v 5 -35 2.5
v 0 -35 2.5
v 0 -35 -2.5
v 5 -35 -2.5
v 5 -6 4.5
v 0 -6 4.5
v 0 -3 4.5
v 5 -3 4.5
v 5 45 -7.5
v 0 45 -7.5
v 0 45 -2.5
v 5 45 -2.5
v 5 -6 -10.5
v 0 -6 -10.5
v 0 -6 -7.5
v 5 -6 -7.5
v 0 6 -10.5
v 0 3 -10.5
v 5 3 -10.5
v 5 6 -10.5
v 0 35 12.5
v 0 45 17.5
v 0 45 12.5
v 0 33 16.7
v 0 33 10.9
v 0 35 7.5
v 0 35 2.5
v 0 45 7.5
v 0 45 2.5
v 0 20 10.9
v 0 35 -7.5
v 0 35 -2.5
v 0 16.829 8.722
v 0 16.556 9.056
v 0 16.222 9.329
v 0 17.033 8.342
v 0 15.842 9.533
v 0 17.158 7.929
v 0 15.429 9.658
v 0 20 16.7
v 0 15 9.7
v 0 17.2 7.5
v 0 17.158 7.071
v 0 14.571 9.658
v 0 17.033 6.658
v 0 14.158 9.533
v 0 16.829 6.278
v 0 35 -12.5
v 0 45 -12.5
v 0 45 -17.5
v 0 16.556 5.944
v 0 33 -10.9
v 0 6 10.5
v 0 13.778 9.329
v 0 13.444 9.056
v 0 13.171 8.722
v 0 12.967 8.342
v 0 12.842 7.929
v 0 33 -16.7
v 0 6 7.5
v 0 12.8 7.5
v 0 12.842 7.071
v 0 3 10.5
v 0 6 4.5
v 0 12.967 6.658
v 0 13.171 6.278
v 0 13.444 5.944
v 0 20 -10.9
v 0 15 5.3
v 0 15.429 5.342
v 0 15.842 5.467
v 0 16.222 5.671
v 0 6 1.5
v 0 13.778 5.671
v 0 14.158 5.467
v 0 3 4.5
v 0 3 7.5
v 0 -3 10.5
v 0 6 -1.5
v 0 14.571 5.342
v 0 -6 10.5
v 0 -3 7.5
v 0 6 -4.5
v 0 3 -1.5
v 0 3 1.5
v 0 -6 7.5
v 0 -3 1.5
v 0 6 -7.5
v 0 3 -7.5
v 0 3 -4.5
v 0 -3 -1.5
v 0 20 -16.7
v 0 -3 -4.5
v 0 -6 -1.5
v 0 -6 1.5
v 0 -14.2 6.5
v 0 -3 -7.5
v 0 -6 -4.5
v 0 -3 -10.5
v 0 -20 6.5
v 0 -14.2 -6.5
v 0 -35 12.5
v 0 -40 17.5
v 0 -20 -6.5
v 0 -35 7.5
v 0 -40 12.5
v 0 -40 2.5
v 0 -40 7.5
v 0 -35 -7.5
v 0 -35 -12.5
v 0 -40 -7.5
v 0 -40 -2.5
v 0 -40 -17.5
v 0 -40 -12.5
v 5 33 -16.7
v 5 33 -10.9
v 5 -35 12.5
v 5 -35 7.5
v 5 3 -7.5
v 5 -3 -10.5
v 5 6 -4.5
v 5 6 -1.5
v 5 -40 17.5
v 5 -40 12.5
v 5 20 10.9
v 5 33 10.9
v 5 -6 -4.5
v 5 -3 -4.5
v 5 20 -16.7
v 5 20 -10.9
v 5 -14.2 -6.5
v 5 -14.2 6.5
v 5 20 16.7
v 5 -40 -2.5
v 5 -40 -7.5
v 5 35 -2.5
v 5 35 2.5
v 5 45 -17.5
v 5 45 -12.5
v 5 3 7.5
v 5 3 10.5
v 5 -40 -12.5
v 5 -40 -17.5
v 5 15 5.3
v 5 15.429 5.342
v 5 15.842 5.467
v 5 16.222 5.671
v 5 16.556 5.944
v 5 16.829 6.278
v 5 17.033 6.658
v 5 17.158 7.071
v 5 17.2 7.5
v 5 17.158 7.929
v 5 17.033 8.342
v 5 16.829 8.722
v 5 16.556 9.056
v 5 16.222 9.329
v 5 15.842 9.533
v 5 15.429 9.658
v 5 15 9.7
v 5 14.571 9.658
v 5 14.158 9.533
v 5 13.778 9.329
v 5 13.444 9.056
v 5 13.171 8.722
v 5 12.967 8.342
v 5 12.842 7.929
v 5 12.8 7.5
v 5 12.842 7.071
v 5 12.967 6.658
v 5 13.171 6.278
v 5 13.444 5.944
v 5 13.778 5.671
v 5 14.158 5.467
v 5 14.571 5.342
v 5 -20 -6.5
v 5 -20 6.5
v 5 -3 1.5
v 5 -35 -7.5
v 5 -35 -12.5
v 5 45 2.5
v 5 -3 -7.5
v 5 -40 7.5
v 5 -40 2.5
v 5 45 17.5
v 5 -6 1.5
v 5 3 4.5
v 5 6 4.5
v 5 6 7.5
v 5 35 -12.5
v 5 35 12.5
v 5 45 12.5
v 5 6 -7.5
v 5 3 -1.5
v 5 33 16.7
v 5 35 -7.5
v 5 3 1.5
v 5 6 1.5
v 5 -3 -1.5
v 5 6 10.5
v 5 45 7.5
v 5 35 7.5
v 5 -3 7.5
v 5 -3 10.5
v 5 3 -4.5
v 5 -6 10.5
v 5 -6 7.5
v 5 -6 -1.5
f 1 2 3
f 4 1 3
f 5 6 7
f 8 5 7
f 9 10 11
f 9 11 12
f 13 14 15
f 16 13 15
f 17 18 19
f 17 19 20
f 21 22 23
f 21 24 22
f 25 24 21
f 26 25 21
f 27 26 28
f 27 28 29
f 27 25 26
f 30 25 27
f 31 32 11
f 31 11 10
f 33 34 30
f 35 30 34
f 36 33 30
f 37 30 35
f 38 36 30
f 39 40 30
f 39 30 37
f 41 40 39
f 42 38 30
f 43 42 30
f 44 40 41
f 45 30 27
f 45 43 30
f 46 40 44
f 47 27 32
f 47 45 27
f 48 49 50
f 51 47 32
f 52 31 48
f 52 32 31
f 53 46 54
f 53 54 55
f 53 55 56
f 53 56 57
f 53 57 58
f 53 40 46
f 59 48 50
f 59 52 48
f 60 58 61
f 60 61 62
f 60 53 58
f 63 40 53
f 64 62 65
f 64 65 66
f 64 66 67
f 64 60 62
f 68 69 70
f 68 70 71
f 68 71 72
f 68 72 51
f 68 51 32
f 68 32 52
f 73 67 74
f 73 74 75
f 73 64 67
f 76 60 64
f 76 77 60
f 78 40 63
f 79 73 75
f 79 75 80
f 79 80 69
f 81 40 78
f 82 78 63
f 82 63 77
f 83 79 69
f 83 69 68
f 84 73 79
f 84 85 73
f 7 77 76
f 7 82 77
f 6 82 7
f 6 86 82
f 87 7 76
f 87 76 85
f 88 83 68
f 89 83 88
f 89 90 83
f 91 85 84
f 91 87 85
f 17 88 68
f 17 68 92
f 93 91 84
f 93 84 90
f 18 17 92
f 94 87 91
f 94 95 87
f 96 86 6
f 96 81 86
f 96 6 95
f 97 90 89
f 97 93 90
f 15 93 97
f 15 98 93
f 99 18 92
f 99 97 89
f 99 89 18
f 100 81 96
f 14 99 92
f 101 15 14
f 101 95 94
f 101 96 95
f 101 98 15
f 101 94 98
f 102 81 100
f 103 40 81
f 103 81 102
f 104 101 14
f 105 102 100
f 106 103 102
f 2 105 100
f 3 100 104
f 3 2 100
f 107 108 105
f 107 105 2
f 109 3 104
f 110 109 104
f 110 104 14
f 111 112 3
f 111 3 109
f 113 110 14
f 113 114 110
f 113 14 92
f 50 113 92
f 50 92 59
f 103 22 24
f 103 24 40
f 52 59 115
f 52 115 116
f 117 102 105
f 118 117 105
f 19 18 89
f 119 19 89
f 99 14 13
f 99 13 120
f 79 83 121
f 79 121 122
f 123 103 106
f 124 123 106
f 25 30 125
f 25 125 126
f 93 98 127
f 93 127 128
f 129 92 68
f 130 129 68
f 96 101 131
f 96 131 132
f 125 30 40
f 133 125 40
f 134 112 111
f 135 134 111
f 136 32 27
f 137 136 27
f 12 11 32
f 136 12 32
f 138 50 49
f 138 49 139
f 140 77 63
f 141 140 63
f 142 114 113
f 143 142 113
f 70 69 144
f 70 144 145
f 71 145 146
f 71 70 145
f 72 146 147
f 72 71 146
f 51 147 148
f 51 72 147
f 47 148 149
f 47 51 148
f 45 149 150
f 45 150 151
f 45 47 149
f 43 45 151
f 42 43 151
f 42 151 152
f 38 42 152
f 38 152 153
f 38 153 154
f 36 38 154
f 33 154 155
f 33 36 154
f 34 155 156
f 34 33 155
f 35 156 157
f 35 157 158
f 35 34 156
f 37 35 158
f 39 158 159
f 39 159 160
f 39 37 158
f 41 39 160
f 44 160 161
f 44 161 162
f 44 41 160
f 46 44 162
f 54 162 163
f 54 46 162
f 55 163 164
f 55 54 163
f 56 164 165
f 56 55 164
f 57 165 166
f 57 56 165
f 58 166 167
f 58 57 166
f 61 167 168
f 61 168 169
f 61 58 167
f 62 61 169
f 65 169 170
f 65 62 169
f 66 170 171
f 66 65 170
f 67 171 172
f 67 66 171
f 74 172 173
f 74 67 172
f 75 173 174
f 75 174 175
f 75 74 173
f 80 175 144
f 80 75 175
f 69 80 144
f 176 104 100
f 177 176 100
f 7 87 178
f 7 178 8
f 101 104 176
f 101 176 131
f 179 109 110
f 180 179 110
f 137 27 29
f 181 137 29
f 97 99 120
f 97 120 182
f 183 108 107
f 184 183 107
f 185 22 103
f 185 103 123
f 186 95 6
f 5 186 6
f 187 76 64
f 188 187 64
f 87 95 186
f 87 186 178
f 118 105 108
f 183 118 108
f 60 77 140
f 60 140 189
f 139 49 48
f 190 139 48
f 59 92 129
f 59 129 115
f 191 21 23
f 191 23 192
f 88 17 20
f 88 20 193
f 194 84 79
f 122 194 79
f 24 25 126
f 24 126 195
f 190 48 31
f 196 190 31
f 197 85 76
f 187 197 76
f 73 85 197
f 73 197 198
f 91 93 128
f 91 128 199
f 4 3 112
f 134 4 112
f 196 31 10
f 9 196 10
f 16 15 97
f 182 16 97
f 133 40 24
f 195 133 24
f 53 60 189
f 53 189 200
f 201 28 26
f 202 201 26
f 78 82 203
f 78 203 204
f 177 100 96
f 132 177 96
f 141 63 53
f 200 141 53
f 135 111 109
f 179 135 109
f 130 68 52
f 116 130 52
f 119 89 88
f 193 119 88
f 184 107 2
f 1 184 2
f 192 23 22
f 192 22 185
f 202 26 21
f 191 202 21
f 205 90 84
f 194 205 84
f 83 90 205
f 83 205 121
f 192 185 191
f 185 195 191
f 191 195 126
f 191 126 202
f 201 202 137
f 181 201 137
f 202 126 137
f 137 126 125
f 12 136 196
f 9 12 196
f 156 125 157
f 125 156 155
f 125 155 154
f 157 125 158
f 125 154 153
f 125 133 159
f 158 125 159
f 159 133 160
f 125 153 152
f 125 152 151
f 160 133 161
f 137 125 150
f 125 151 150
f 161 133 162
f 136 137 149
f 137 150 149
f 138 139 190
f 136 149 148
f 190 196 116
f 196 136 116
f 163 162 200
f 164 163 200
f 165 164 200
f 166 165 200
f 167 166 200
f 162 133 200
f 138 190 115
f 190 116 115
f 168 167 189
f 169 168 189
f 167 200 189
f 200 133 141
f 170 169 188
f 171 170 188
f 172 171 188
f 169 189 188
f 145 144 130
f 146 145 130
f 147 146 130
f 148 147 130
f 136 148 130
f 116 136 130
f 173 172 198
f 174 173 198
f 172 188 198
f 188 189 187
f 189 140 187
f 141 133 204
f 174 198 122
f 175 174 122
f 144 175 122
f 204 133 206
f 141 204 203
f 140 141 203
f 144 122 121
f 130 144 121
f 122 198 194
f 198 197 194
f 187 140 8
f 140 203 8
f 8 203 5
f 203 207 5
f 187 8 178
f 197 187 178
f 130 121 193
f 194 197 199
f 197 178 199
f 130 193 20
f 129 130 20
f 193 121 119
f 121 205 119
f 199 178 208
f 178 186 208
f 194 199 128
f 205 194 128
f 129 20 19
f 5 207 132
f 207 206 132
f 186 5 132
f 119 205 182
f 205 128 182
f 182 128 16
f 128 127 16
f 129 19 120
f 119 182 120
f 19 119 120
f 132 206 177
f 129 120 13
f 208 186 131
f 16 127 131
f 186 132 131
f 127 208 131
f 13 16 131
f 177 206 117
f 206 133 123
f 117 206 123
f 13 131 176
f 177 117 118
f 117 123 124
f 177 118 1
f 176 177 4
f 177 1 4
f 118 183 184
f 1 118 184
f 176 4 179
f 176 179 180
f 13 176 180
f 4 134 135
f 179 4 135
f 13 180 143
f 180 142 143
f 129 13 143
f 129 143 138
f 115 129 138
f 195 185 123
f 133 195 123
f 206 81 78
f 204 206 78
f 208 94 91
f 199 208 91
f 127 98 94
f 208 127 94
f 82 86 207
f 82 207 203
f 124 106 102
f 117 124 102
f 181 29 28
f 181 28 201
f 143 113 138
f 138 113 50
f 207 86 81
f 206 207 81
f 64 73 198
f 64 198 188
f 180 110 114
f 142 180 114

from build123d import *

# Parameters (mm, degrees)
BOSS_EXTRU_1_OUTLINE_R  = 2.2
BOSS_EXTRU_1_DEPTH      = 5
ESQUISSE3_W             = 5
ESQUISSE3_H             = 5
BOSS_EXTRU_3_DEPTH      = 5
ESQUISSE4_W             = 3
ESQUISSE4_H             = 3
ENL_V_MAT_EXTRU_1_DEPTH = 10
ESQUISSE6_W             = 13
ESQUISSE6_H             = 5.8
ENL_V_MAT_EXTRU_2_DEPTH = 10
ESQUISSE7_W             = 5.8
ESQUISSE7_H             = 13
ENL_V_MAT_EXTRU_3_DEPTH = 10


# Read off the part's stored shape, not the designer's step: Boss.-Extru.1
with BuildPart() as part:
    # Boss.-Extru.1 outline → Boss.-Extru.1 (new body)
    with BuildSketch(Plane(origin=(0, 0, 0), x_dir=(0, 0, -1), z_dir=(1, 0, 0))):
        Polygon((-12.5, 40.000001465), (-17.5, 40.000001465), (-17.5, -40.000001465), (-12.5, -40.000001465), (-12.5, -35.000001465), (-7.5, -35.000001465), (-7.5, -40.000001465), (-2.5, -40.000001465), (-2.5, -35.000001465), (2.5, -35.000001465), (2.5, -40.000001465), (7.5, -40.000001465), (7.5, -35.000001465), (12.5, -35.000001465), (12.5, -40.000001465), (17.5, -40.000001465), (17.5, 40.000001465), (12.5, 40.000001465), (12.5, 35.000001047), (7.5, 35.000000628), (7.5, 40.000001465), (2.5, 40.000001465), (2.5, 35.000000209), (-2.5, 34.999999791), (-2.5, 40.000001465), (-7.5, 40.000001465), (-7.5, 34.999999372), (-12.5, 34.999998953), align=None)
        with Locations((-7.5, 14.999999372)):
            Circle(BOSS_EXTRU_1_OUTLINE_R, mode=Mode.SUBTRACT)
    extrude(amount=BOSS_EXTRU_1_DEPTH)

    # Esquisse3 → Boss.-Extru.3 (add)
    with BuildSketch(Plane(origin=(0, 40.000001465, 0), x_dir=(1, 0, 0), z_dir=(0, 1, 0))):
        with Locations((2.5, -15)):
            Rectangle(ESQUISSE3_W, ESQUISSE3_H)
        with Locations((2.5, -5)):
            Rectangle(ESQUISSE3_W, ESQUISSE3_H)
        with Locations((2.5, 5)):
            Rectangle(ESQUISSE3_W, ESQUISSE3_H)
        with Locations((2.5, 15)):
            Rectangle(ESQUISSE3_W, ESQUISSE3_H)
    extrude(amount=BOSS_EXTRU_3_DEPTH)

    # Esquisse4 → Enlèv. mat.-Extru.1 (cut)
    with BuildSketch(Plane.ZY):
        with Locations((-3, -4.5)):
            Rectangle(ESQUISSE4_W, ESQUISSE4_H)
        with Locations((-9, -4.5)):
            Rectangle(ESQUISSE4_W, ESQUISSE4_H)
        with Locations((3, -4.5)):
            Rectangle(ESQUISSE4_W, ESQUISSE4_H)
        with Locations((9, -4.5)):
            Rectangle(ESQUISSE4_W, ESQUISSE4_H)
        with Locations((9, 4.5)):
            Rectangle(ESQUISSE4_W, ESQUISSE4_H)
        with Locations((3, 4.5)):
            Rectangle(ESQUISSE4_W, ESQUISSE4_H)
        with Locations((-3, 4.5)):
            Rectangle(ESQUISSE4_W, ESQUISSE4_H)
        with Locations((-9, 4.5)):
            Rectangle(ESQUISSE4_W, ESQUISSE4_H)
    extrude(amount=-ENL_V_MAT_EXTRU_1_DEPTH, mode=Mode.SUBTRACT)

    # Esquisse6 → Enlèv. mat.-Extru.2 (cut)
    with BuildSketch(Plane.ZY):
        with Locations((0, -17.1)):
            Rectangle(ESQUISSE6_W, ESQUISSE6_H)
    extrude(amount=-ENL_V_MAT_EXTRU_2_DEPTH, mode=Mode.SUBTRACT)

    # Esquisse7 → Enlèv. mat.-Extru.3 (cut)
    with BuildSketch(Plane.ZY):
        with Locations((-13.8, 26.5)):
            Rectangle(ESQUISSE7_W, ESQUISSE7_H)
        with Locations((13.8, 26.5)):
            Rectangle(ESQUISSE7_W, ESQUISSE7_H)
    extrude(amount=-ENL_V_MAT_EXTRU_3_DEPTH, mode=Mode.SUBTRACT)


solid = part.part
